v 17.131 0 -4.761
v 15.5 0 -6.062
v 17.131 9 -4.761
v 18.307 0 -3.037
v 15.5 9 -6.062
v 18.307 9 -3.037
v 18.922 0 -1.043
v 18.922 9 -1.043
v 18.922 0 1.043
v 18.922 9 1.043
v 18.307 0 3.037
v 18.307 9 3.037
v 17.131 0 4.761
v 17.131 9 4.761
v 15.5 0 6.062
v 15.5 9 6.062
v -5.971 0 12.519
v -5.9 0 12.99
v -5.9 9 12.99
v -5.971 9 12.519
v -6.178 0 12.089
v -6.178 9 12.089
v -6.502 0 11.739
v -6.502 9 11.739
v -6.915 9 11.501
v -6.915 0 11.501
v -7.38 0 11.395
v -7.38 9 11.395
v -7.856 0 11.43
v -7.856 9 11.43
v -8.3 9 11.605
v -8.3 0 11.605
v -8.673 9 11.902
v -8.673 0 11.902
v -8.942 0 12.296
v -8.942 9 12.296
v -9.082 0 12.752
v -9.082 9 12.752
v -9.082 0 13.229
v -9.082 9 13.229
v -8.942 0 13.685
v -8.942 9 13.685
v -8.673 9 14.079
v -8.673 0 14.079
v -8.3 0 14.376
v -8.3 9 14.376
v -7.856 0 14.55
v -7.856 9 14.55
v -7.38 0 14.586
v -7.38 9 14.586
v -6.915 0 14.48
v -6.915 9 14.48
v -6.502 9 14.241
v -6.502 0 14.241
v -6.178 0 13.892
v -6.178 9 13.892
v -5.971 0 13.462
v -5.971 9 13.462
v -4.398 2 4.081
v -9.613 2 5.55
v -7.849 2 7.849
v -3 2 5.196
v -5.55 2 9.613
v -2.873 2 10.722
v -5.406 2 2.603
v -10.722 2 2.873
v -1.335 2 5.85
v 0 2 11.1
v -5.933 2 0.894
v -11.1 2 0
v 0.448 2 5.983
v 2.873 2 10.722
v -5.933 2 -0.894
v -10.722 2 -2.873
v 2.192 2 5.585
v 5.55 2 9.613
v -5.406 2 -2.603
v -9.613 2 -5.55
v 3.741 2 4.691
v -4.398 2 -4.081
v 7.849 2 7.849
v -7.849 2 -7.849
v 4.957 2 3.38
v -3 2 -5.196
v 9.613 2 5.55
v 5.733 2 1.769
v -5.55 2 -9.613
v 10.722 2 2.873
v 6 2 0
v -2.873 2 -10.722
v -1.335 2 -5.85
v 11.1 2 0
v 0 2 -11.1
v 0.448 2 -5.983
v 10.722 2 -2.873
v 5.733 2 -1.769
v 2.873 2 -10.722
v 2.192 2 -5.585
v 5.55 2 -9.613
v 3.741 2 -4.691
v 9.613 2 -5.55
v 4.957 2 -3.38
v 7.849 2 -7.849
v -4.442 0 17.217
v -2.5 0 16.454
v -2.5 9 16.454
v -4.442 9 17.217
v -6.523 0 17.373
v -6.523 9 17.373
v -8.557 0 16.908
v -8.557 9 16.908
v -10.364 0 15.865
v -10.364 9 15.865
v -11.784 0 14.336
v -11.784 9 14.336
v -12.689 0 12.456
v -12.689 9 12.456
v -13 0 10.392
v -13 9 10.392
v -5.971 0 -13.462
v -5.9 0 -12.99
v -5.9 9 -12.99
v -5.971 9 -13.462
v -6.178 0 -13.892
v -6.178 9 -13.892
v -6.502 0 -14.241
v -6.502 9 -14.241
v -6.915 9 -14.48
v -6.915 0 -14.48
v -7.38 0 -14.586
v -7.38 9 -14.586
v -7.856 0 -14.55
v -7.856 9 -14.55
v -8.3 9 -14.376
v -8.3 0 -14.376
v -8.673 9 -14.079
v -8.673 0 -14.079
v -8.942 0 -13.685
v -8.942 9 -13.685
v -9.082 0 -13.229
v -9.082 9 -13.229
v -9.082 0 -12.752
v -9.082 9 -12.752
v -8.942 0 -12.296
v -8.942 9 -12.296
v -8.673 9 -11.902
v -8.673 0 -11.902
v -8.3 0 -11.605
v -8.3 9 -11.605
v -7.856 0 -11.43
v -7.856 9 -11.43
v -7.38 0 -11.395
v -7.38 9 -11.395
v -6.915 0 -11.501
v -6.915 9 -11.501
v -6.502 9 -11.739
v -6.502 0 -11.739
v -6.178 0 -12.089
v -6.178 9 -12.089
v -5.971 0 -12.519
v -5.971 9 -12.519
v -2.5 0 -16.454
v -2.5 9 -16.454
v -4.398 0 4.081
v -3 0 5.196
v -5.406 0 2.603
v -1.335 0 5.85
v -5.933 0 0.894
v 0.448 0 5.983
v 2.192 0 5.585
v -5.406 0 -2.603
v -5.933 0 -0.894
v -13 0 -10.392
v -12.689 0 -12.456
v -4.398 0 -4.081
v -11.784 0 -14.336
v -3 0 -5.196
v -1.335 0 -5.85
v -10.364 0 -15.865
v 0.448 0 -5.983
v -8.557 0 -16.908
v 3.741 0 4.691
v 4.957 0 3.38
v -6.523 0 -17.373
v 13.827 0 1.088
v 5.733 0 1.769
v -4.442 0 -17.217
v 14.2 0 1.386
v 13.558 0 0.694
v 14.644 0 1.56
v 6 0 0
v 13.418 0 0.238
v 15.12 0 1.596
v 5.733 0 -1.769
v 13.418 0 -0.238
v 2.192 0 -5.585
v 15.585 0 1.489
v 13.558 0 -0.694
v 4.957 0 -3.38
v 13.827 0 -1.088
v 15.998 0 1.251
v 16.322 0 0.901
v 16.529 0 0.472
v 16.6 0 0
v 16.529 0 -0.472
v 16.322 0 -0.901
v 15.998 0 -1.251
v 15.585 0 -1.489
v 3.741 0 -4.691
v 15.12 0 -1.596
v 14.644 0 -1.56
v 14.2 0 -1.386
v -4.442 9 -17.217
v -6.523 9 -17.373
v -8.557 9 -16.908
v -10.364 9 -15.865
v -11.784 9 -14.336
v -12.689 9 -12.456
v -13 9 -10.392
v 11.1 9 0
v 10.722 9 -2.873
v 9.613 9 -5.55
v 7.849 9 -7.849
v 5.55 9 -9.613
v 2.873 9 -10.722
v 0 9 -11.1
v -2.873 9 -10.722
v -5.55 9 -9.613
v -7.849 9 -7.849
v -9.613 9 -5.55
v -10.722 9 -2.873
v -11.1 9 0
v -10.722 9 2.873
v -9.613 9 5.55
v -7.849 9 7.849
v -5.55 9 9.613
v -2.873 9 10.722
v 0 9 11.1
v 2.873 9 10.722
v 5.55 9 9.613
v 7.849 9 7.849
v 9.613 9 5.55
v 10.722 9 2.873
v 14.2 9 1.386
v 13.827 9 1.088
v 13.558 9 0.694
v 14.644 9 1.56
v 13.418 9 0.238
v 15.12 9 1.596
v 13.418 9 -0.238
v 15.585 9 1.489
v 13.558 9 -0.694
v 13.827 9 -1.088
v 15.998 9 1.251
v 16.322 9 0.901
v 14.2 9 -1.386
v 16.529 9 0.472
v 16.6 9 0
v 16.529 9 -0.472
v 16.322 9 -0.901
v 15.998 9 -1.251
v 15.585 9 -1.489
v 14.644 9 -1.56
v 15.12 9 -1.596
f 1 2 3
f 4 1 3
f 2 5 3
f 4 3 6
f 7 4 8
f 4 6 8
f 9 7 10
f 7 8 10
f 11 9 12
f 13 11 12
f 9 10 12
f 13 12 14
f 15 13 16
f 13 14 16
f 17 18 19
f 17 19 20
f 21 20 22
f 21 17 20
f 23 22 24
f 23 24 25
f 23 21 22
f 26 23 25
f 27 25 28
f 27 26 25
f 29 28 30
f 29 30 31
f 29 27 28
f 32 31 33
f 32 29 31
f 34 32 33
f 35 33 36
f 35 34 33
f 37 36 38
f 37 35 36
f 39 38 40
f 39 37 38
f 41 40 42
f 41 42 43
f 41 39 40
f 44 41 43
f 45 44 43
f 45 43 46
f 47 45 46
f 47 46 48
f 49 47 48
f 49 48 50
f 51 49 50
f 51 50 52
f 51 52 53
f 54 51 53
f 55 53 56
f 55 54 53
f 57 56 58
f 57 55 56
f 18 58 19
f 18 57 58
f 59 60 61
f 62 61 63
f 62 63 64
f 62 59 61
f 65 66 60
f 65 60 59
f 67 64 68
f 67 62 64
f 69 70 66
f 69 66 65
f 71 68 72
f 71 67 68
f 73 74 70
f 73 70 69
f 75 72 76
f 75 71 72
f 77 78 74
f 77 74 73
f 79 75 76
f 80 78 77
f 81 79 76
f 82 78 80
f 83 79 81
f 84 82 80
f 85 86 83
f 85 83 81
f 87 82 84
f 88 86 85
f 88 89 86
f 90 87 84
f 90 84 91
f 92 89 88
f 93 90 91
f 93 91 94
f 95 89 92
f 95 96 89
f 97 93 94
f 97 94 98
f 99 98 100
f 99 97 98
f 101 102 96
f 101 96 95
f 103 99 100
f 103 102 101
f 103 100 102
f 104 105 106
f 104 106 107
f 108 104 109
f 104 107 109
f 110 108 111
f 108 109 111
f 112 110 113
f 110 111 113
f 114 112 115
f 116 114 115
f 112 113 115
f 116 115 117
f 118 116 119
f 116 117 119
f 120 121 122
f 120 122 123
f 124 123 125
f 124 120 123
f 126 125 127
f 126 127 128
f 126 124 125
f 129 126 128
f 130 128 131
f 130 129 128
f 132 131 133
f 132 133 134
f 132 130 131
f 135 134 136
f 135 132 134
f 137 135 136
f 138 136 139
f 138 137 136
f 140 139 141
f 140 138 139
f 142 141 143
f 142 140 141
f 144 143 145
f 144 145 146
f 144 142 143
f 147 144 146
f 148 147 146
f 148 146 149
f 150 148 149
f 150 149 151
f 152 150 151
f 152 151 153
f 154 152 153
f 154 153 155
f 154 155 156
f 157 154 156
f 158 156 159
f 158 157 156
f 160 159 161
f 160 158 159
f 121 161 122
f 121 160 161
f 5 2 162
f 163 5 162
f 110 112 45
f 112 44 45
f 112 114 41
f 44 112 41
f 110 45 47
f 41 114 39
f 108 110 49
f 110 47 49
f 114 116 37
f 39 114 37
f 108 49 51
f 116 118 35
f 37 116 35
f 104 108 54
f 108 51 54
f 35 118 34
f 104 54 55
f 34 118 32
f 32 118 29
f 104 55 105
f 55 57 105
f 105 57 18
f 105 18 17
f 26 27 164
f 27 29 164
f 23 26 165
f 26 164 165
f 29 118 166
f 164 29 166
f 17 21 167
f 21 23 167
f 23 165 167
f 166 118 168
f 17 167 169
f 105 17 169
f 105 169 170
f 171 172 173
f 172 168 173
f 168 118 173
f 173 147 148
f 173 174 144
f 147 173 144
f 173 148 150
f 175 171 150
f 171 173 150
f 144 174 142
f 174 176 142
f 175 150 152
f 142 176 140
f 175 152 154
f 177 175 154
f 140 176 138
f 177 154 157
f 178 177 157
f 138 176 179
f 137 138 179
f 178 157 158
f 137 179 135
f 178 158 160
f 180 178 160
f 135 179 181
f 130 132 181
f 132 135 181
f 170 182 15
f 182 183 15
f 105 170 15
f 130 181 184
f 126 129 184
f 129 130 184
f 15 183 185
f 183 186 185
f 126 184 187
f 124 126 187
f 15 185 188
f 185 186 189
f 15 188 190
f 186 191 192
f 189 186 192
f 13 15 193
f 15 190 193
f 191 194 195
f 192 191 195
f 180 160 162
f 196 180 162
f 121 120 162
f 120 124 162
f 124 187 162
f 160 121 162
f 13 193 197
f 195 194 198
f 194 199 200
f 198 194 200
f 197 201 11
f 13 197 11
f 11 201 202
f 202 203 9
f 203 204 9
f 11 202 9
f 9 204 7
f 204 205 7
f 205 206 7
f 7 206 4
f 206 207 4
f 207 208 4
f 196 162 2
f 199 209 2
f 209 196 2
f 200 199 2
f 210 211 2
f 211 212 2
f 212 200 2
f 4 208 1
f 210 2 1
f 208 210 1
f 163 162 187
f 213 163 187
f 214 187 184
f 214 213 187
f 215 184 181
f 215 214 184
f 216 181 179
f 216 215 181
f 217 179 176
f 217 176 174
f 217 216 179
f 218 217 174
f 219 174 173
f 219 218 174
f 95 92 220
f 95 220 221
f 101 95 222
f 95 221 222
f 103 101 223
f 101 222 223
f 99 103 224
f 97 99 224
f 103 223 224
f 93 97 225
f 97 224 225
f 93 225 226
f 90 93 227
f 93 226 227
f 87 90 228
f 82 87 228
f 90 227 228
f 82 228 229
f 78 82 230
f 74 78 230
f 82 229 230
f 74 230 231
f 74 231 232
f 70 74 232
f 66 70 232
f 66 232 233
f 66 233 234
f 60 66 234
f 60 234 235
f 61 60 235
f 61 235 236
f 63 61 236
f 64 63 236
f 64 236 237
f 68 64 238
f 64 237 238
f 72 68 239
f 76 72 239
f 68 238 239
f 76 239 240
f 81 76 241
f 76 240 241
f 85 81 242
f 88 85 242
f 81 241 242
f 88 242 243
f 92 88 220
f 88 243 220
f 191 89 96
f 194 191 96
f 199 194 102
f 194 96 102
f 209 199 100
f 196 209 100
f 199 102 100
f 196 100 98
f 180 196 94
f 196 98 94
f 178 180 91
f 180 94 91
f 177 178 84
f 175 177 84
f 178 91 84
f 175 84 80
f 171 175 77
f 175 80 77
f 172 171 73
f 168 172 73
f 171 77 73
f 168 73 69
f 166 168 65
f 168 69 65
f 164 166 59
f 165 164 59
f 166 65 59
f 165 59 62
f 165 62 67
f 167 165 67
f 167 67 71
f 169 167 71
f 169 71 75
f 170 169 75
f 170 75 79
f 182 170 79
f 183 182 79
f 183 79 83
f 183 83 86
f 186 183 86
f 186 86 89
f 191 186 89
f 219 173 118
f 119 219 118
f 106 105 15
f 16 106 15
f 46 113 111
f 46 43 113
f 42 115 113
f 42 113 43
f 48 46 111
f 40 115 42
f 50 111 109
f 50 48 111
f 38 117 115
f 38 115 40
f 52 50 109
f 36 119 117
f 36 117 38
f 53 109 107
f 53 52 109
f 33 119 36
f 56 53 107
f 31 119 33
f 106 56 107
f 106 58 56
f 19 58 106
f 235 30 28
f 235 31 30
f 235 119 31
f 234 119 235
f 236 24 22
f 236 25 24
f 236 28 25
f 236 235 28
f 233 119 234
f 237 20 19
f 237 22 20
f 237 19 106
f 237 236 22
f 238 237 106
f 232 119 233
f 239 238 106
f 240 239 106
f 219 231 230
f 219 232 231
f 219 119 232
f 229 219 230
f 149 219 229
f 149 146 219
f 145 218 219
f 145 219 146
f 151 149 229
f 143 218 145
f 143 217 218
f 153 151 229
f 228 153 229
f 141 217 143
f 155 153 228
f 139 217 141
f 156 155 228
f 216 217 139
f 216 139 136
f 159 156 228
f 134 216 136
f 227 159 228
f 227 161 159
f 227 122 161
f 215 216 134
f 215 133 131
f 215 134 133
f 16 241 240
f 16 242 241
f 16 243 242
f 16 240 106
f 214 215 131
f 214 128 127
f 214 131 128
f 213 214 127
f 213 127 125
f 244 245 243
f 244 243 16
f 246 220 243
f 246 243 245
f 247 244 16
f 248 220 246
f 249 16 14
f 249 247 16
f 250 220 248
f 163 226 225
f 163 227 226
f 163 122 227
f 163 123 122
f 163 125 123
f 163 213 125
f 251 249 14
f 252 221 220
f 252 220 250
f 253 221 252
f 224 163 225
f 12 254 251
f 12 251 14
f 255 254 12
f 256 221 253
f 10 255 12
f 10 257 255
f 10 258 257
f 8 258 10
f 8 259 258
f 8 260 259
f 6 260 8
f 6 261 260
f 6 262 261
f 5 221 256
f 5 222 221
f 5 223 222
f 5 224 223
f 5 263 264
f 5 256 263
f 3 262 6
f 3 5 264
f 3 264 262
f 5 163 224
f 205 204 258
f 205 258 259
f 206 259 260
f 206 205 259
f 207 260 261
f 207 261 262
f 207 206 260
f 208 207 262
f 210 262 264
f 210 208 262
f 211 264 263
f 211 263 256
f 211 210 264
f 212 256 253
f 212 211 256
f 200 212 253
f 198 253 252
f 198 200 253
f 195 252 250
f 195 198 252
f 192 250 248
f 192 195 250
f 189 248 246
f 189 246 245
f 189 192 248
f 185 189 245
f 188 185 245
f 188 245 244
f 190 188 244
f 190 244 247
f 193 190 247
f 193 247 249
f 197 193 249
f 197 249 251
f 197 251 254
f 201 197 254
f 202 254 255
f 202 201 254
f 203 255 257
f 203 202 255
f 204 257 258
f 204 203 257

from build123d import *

# Parameters (mm, degrees)
SKETCH1_R           = 1.6
BOSS_EXTRUDE1_DEPTH = 9
SKETCH2_R           = 11.1
CUT_EXTRUDE1_DEPTH  = 7
FILLET1_R           = 7
SKETCH3_R           = 6
CUT_EXTRUDE2_DEPTH  = 3


with BuildPart() as part:
    # Sketch1 → Boss-Extrude1 (new body)
    with BuildSketch(Plane(origin=(0, 0, 0), x_dir=(1, 0, 0), z_dir=(0, 1, 0))):
        Polygon((26, 0), (-13, 22.516660498), (-13, -22.516660498), align=None)
        with Locations((-7.5, 12.990381057)):
            Circle(SKETCH1_R, mode=Mode.SUBTRACT)
        with Locations((15, 0)):
            Circle(SKETCH1_R, mode=Mode.SUBTRACT)
        with Locations((-7.5, -12.990381057)):
            Circle(SKETCH1_R, mode=Mode.SUBTRACT)
    extrude(amount=BOSS_EXTRUDE1_DEPTH)

    # Sketch2 → Cut-Extrude1 (cut)
    with BuildSketch(Plane(origin=(0, 9, 0), x_dir=(1, 0, 0), z_dir=(0, 1, 0))):
        Circle(SKETCH2_R)
    extrude(amount=-CUT_EXTRUDE1_DEPTH, mode=Mode.SUBTRACT)

    # Fillet1
    fillet1_edges = [part.edges().sort_by_distance(p)[0] for p in [
        (-13, 4.5, 22.516660498),
        (-13, 4.5, -22.516660498),
        (26, 4.5, 0),
    ]]
    fillet(fillet1_edges, radius=FILLET1_R)

    # Sketch3 → Cut-Extrude2 (cut, through all)
    with BuildSketch(Plane(origin=(0, 2, 0), x_dir=(1, 0, 0), z_dir=(0, 1, 0))):
        Circle(SKETCH3_R)
    extrude(amount=-CUT_EXTRUDE2_DEPTH, mode=Mode.SUBTRACT)


solid = part.part
